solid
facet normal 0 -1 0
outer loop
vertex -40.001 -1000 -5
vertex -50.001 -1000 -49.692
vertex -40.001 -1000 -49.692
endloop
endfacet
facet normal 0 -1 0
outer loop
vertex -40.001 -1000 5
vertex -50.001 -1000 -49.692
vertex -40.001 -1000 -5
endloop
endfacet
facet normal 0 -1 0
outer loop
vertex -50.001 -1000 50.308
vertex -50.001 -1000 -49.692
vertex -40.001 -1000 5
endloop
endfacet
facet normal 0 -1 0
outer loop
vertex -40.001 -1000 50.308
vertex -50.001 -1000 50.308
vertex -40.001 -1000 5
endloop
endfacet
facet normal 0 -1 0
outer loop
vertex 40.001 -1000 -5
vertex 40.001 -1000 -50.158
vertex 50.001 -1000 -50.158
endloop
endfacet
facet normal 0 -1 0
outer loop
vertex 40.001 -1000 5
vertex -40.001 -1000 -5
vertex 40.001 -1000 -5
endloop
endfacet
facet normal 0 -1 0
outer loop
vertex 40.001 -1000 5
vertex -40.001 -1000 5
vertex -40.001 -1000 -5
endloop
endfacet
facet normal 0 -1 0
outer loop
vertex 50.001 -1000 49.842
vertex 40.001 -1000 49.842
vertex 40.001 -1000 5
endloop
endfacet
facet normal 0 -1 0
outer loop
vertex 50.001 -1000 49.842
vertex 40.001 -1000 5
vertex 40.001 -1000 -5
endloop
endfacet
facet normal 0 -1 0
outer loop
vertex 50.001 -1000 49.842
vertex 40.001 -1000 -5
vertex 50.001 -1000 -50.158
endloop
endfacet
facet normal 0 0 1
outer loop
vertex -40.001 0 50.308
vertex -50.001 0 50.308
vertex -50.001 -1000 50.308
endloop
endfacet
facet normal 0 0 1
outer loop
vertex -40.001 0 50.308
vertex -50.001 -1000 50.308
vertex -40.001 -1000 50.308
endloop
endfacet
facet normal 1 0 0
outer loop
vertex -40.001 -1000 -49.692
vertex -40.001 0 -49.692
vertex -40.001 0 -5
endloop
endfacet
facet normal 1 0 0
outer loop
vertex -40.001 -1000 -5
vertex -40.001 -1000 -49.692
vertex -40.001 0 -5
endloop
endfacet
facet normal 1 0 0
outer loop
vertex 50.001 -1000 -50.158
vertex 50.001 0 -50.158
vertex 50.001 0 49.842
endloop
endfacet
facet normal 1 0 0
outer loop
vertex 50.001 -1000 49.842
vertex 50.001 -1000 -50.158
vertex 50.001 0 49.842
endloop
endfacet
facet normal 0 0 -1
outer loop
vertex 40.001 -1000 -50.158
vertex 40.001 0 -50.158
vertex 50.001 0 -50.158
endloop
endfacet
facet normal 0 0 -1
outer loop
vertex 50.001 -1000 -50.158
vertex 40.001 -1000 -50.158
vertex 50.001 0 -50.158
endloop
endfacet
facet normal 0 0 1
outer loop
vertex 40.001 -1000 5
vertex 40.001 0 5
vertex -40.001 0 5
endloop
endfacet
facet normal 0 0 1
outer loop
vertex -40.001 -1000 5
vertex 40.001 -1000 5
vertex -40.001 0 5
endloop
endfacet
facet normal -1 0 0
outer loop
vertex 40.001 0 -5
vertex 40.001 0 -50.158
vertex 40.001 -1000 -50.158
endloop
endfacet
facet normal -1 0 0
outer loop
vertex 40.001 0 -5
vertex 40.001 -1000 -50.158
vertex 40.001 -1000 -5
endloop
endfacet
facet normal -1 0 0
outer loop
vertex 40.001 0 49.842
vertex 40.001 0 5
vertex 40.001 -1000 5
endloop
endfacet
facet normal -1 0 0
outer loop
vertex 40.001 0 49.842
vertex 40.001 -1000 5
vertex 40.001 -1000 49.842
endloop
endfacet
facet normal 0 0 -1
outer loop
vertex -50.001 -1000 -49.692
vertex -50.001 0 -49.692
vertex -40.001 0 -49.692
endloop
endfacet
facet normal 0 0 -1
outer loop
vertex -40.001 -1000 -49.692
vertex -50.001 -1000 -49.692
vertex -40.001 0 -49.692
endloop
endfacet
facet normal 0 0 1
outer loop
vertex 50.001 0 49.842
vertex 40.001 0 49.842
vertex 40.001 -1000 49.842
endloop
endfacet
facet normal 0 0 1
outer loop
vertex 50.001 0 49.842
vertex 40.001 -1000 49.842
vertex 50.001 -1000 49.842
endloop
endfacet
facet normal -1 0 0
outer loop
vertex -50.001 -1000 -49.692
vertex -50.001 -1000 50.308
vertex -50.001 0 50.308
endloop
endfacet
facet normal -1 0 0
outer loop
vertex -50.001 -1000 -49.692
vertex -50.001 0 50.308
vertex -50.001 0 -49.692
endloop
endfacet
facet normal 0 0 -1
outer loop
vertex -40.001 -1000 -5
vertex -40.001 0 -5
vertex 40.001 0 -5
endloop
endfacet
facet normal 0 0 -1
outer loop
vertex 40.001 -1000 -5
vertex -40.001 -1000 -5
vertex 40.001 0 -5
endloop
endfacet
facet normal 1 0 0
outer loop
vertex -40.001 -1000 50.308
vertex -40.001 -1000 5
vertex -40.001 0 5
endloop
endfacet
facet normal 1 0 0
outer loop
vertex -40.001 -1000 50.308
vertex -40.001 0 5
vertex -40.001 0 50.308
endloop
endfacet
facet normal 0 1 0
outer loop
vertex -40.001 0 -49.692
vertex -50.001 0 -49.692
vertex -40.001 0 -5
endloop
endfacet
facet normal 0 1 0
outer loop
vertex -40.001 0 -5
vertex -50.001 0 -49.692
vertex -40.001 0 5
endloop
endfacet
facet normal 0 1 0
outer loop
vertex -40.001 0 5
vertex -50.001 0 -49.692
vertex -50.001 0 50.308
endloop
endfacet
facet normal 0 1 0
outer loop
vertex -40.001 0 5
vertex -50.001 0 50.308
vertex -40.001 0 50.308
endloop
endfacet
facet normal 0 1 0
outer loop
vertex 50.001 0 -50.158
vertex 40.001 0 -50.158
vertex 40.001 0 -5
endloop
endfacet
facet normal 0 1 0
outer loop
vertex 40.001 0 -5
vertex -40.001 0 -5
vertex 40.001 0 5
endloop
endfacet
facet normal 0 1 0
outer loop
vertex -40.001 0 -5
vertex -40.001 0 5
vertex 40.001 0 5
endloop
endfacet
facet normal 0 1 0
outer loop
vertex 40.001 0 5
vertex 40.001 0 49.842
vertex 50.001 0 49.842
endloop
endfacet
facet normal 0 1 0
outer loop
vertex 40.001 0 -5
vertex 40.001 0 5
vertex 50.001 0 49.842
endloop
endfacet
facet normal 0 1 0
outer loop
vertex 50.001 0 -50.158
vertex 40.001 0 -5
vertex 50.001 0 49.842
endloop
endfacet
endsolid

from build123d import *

# Parameters (mm, degrees)
F0_W     = 10
F0_H     = 5
F0_H_2   = 44.692295
F0_H_3   = 45.307705
F0_H_4   = 45.157636
F0_H_5   = 44.842364
F1_DEPTH = 1000


with BuildPart() as f1:
    # F0 (on Front) → F1 (new body)
    with BuildSketch(Plane.XZ):
        Polygon((40.000761, 0), (0, 0), (-40.000761, 0), (-40.000761, -5), (0, -5), (40.000761, -5), align=None)
        Polygon((-40.000761, 0), (0, 0), (40.000761, 0), (40.000761, 5), (0, 5), (-40.000761, 5), align=None)
        with Locations((-45.000761, -2.5)):
            Rectangle(F0_W, F0_H)
        with Locations((-45.000761, 2.5)):
            Rectangle(F0_W, F0_H)
        with Locations((45.000761, 2.5)):
            Rectangle(F0_W, F0_H)
        with Locations((45.000761, -2.5)):
            Rectangle(F0_W, F0_H)
        with Locations((-45.000761, -27.346147)):
            Rectangle(F0_W, F0_H_2)
        with Locations((-45.000761, 27.653852)):
            Rectangle(F0_W, F0_H_3)
        with Locations((45.000761, -27.578818)):
            Rectangle(F0_W, F0_H_4)
        with Locations((45.000761, 27.421182)):
            Rectangle(F0_W, F0_H_5)
    extrude(amount=F1_DEPTH)


solid = f1.part
